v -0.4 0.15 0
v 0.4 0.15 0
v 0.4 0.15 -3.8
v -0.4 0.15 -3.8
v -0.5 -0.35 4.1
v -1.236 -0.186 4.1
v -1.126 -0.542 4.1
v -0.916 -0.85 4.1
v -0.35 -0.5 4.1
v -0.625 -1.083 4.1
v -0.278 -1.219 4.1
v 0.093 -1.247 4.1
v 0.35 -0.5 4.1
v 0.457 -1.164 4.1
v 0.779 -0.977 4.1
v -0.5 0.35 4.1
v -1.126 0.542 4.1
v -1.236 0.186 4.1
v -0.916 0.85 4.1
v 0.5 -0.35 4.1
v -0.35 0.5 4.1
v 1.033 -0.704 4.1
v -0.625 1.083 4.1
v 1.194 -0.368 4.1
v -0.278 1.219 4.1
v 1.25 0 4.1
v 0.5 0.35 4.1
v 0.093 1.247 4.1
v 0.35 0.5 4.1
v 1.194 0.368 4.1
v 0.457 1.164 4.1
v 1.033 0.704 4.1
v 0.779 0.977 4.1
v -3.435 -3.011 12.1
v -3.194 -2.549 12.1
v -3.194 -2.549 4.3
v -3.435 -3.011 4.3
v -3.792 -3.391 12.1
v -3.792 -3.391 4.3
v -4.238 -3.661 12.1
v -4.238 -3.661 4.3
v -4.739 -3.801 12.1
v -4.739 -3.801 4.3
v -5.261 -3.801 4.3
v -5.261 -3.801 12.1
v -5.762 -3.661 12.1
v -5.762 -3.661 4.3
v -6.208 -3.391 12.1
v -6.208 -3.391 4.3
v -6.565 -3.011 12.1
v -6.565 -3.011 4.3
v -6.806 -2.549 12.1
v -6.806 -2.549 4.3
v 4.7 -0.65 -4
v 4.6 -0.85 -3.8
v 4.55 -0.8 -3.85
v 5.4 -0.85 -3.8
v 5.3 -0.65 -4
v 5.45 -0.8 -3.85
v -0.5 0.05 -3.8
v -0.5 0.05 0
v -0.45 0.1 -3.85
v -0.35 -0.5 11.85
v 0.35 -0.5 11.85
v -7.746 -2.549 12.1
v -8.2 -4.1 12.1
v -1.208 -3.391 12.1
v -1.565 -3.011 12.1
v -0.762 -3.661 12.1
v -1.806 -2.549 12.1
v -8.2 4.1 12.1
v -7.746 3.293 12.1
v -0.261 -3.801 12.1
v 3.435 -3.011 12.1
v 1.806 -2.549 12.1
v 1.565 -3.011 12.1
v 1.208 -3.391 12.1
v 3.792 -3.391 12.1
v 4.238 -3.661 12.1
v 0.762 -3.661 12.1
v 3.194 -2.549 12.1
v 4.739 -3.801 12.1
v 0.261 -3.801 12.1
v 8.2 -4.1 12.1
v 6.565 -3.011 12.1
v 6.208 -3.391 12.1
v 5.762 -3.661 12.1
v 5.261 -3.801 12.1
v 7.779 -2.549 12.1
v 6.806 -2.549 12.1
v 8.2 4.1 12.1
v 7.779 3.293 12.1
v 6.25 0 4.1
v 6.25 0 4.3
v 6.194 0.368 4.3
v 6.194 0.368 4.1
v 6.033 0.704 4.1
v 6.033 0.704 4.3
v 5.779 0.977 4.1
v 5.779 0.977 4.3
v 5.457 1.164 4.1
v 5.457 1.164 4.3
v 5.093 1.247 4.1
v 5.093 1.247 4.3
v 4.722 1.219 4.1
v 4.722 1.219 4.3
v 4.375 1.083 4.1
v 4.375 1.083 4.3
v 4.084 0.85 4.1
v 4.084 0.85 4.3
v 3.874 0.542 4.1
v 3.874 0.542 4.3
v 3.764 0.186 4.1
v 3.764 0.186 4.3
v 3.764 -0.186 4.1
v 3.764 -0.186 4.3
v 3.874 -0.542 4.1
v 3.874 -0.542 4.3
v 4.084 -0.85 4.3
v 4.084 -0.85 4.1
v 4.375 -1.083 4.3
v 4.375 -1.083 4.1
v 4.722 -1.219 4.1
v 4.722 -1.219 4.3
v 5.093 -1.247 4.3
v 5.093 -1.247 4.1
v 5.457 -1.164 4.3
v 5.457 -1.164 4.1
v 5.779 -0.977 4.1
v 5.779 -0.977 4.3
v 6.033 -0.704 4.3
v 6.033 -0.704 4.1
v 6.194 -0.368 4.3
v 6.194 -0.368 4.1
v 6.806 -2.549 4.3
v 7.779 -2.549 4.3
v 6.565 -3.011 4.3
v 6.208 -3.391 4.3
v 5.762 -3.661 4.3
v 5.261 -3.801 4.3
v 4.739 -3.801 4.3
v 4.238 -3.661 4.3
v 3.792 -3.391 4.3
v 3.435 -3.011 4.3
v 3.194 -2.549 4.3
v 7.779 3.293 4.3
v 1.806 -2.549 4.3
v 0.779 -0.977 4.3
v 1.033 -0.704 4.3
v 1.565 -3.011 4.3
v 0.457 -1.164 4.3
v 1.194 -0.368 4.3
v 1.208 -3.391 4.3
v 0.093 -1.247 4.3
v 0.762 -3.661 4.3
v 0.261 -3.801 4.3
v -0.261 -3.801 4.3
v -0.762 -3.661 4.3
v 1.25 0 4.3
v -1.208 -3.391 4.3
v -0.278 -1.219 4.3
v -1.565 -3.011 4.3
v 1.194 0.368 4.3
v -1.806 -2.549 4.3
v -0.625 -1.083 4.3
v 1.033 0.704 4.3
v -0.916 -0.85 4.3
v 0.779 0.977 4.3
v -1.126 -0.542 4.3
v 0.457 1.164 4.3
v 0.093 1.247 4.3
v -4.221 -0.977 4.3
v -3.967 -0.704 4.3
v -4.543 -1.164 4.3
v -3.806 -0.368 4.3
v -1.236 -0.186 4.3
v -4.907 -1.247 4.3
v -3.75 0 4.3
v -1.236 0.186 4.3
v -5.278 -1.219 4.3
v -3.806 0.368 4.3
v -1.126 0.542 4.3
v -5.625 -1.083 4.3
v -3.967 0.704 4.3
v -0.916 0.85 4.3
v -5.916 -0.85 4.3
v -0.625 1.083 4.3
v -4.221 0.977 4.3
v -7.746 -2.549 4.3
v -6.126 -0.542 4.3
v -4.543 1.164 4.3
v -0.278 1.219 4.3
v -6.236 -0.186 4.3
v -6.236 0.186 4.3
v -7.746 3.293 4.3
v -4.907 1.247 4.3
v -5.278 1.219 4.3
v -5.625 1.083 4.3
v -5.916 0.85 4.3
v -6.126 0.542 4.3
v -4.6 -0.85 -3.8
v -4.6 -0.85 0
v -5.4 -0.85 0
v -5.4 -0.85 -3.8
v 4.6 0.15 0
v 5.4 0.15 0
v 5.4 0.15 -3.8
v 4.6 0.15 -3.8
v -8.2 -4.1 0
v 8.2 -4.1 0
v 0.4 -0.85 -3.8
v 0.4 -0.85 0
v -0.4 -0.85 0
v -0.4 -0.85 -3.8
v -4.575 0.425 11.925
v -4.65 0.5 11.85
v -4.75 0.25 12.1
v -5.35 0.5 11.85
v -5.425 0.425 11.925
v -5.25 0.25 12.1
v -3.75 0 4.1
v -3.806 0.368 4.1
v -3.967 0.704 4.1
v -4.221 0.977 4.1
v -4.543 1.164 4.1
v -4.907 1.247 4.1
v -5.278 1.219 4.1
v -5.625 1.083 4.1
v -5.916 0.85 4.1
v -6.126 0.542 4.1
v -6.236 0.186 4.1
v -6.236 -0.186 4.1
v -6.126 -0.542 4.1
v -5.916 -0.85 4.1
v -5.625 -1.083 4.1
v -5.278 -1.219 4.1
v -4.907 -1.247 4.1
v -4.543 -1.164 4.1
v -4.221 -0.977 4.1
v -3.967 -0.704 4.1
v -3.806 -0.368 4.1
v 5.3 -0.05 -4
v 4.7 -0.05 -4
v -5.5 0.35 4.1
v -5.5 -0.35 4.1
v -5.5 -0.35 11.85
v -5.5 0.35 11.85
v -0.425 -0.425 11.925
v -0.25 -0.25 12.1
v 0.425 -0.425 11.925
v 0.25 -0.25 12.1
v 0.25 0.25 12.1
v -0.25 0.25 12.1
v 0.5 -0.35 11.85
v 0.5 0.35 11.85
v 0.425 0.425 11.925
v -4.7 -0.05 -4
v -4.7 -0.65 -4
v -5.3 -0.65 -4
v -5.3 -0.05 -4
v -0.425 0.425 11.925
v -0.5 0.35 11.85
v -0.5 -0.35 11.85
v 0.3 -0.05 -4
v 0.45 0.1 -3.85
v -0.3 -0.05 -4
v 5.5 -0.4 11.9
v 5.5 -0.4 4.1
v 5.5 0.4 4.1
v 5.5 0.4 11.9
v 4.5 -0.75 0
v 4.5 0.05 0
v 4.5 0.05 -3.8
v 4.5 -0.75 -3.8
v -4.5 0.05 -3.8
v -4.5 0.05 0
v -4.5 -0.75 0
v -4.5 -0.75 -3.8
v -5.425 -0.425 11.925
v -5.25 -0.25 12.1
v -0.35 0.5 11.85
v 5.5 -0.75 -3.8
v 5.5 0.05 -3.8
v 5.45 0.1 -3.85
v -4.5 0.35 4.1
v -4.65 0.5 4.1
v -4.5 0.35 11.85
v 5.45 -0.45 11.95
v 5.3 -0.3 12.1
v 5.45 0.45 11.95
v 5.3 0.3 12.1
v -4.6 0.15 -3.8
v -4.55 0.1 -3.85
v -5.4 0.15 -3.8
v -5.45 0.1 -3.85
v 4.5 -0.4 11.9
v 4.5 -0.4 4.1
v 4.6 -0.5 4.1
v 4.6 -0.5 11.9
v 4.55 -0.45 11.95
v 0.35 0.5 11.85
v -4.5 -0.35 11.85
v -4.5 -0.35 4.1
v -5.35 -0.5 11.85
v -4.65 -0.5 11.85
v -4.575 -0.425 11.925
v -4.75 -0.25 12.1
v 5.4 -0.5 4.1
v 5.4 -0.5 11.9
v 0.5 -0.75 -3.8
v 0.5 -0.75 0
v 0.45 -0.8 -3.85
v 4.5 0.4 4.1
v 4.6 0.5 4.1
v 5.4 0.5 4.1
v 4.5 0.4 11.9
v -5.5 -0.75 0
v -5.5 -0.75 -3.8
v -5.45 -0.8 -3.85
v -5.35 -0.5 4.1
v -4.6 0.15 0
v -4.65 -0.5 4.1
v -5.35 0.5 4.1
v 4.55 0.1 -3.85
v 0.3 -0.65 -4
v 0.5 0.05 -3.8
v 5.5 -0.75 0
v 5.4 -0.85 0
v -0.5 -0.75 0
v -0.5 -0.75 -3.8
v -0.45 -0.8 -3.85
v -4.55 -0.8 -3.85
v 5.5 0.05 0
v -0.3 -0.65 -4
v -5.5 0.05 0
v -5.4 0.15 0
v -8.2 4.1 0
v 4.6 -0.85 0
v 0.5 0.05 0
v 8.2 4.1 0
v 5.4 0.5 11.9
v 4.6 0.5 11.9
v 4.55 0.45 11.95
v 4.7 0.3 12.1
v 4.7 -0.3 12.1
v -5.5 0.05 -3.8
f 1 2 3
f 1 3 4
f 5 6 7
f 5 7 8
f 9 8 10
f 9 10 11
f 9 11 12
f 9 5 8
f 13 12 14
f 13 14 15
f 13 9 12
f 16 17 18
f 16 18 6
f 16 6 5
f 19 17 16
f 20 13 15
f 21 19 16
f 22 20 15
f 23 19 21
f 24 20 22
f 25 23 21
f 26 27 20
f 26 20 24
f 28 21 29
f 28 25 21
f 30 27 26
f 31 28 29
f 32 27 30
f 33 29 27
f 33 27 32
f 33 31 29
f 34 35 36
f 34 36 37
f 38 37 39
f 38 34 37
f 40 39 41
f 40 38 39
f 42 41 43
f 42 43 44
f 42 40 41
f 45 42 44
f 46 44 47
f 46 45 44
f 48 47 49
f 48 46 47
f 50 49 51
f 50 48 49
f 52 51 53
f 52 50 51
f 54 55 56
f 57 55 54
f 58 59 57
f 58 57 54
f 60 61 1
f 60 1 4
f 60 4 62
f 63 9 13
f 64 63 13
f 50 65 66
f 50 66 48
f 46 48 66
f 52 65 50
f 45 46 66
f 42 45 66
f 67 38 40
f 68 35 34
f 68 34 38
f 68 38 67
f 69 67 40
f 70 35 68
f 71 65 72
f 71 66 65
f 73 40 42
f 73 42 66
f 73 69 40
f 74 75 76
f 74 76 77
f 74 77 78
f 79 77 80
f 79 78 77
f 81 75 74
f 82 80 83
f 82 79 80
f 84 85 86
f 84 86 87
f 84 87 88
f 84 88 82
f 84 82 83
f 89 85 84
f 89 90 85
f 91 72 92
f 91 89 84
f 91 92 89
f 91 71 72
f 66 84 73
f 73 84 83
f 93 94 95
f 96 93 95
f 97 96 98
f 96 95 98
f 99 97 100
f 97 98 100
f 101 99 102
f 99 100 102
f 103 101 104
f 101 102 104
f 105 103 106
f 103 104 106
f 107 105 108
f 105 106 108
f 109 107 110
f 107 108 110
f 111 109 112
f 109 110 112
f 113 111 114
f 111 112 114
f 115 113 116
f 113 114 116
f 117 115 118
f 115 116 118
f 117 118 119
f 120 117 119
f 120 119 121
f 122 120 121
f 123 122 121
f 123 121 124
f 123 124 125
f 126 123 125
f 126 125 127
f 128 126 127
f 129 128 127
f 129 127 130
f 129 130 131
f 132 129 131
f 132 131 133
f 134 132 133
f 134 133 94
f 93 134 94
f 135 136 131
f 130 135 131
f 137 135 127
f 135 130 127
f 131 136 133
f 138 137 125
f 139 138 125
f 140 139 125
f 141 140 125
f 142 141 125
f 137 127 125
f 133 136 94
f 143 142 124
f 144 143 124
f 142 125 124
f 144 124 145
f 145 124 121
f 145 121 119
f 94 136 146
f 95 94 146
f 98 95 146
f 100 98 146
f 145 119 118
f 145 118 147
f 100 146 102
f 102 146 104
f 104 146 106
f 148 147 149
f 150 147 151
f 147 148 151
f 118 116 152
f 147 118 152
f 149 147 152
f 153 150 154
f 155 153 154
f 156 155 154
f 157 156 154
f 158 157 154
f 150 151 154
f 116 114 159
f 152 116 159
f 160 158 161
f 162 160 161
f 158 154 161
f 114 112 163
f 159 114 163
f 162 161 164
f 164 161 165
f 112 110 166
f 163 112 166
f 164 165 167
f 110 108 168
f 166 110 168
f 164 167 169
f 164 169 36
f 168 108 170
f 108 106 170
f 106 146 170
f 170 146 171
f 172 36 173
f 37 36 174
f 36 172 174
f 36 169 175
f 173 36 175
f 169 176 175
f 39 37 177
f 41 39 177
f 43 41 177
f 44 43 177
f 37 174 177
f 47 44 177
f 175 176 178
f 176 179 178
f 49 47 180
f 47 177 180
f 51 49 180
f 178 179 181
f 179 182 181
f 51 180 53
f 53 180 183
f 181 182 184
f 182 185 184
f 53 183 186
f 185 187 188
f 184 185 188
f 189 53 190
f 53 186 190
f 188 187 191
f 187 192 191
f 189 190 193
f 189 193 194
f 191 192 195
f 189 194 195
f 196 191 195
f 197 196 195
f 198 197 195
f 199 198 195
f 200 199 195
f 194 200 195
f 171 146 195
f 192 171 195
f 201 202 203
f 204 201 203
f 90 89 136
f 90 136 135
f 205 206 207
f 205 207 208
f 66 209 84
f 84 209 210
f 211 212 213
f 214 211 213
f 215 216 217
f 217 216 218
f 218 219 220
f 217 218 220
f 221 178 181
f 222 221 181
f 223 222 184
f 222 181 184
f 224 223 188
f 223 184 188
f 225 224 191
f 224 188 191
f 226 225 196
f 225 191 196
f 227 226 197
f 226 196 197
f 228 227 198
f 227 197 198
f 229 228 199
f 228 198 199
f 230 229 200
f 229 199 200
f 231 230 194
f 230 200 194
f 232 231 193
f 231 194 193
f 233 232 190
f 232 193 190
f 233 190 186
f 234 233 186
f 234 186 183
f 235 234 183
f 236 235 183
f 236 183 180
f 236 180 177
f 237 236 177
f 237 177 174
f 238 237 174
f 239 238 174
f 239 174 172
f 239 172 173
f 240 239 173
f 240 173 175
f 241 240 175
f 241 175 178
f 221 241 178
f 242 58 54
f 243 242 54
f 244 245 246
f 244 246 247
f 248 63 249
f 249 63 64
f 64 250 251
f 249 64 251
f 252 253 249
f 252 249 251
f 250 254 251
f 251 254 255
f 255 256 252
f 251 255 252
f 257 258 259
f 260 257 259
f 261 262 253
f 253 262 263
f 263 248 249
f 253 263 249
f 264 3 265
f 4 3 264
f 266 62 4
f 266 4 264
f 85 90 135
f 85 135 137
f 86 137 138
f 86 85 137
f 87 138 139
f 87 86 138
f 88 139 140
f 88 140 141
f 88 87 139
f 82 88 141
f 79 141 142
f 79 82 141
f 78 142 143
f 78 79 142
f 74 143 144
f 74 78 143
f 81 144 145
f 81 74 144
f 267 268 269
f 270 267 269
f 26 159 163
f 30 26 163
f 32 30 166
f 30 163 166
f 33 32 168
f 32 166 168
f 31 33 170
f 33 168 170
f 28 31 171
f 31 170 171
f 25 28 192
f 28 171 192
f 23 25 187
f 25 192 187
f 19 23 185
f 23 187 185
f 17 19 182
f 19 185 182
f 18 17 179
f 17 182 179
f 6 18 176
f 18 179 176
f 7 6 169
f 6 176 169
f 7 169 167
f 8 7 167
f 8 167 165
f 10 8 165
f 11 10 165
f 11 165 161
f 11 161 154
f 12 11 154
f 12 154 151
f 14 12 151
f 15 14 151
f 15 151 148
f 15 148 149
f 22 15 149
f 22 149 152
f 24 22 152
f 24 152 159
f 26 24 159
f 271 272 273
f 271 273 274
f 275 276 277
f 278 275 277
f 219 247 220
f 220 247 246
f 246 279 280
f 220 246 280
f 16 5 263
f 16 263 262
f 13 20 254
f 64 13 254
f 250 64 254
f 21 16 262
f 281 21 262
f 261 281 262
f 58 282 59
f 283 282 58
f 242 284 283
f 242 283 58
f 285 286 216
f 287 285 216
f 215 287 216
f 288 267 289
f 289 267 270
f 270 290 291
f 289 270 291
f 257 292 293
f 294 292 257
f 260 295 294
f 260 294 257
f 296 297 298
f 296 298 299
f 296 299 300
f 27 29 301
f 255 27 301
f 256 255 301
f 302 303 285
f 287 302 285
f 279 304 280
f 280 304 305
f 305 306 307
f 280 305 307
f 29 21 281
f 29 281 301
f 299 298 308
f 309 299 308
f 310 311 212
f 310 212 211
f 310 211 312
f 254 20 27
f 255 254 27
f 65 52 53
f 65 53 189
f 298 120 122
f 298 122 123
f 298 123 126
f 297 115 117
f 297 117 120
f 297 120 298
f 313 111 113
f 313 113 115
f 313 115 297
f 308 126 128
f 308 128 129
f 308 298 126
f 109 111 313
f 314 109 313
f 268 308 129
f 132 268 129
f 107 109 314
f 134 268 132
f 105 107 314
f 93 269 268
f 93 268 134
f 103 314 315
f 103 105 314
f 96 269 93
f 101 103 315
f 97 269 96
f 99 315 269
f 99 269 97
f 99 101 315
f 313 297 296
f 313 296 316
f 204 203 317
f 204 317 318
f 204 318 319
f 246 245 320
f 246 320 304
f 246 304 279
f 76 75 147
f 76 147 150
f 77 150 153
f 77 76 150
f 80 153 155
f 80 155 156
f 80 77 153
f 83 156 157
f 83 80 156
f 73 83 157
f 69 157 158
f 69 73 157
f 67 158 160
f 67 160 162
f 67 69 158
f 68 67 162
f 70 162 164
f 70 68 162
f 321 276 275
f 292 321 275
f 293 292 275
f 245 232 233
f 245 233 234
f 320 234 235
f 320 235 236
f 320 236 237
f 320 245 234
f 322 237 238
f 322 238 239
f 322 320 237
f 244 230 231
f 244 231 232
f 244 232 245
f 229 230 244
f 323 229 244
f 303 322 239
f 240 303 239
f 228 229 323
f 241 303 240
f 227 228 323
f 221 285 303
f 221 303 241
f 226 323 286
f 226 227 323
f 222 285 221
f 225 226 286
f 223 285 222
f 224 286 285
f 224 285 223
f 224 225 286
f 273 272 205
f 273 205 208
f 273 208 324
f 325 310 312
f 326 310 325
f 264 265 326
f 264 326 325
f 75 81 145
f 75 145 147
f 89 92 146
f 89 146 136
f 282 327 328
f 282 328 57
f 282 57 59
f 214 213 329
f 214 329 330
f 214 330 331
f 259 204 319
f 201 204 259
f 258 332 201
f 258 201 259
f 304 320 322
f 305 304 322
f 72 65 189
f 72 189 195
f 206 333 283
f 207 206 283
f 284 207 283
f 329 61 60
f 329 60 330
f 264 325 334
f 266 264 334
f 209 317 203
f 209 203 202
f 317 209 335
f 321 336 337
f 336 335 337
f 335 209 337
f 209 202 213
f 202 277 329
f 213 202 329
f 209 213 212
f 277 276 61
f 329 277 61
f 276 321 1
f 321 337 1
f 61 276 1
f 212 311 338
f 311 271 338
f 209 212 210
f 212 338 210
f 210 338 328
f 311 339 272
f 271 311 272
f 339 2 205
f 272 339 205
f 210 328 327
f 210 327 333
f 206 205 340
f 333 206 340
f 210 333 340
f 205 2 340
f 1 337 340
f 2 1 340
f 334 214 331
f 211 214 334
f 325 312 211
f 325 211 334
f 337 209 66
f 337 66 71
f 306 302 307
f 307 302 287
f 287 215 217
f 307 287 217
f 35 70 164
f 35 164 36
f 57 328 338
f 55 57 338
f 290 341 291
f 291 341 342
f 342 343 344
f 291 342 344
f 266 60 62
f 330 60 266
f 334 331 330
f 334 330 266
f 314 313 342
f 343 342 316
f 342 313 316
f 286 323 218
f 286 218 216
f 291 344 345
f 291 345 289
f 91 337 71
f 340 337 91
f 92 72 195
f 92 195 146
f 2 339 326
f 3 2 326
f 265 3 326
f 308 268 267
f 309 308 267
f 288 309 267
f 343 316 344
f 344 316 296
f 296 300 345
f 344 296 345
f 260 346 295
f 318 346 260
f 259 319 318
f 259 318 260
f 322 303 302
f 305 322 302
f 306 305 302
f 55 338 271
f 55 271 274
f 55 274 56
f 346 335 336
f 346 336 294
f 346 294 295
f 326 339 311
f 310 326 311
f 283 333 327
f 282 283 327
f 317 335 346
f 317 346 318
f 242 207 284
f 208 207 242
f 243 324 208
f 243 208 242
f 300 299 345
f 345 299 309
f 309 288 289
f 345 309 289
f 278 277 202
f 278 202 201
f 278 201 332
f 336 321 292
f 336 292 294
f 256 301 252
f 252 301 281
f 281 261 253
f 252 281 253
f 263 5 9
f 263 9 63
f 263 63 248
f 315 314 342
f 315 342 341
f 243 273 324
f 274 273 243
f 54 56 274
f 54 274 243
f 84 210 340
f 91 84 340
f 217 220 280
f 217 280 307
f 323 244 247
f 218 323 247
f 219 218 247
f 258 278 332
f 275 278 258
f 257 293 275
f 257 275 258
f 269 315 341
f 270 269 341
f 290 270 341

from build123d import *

# Parameters (mm, degrees)
SKETCH_1_W          = 16.4
SKETCH_1_H          = 8.2
EXTRUDE_1_DEPTH     = 12.1
SKETCH_4_R          = 1.25
CUT_EXTRUDE_3_DEPTH = 8
CUT_EXTRUDE_4_DEPTH = 7.8
SKETCH_7_W          = 1
SKETCH_7_H          = 1
EXTRUDE_2_DEPTH     = 8
CHAMFER_1_SIZE      = 0.15
CHAMFER_2_SIZE      = 0.25
SKETCH_8_W          = 1
SKETCH_8_H          = 1
EXTRUDE_3_DEPTH     = 4
CHAMFER_6_SIZE      = 0.1
CHAMFER_7_SIZE      = 0.2
CHAMFER_10_SIZE     = 0.1
CHAMFER_11_SIZE     = 0.2


with BuildPart() as part:
    # Эскиз1 → Бобышка-Вытянуть1 (new body)
    with BuildSketch(Plane.XY):
        Rectangle(SKETCH_1_W, SKETCH_1_H)
    extrude(amount=EXTRUDE_1_DEPTH)

    # Эскиз4 → Вырез-Вытянуть3 (cut)
    with BuildSketch(Plane.XY.offset(12.1)):
        with Locations((-5, 0)):
            Circle(SKETCH_4_R)
        Circle(SKETCH_4_R)
        with Locations((5, 0)):
            Circle(SKETCH_4_R)
    extrude(amount=-CUT_EXTRUDE_3_DEPTH, mode=Mode.SUBTRACT)

    # Эскиз5 → Вырез-Вытянуть4 (cut)
    with BuildSketch(Plane.XY.offset(12.1)):
        with BuildLine():
            Line((-7.745621634, 0), (-7.745621634, 3.292901982))
            Line((-7.745621634, 3.292901982), (2.778509544, 3.292901982))
            Line((2.778509544, 3.292901982), (7.778509544, 3.292901982))
            Line((7.778509544, 3.292901982), (7.778509544, -2.548957219))
            Line((7.778509544, -2.548957219), (6.80582632, -2.548957219))
            ThreePointArc((6.80582632, -2.548957219), (5, -3.818893996), (3.19417368, -2.548957219))
            Line((3.19417368, -2.548957219), (1.80582632, -2.548957219))
            ThreePointArc((1.80582632, -2.548957219), (0, -3.818893996), (-1.80582632, -2.548957219))
            Line((-1.80582632, -2.548957219), (-3.19417368, -2.548957219))
            ThreePointArc((-3.19417368, -2.548957219), (-5, -3.818893996), (-6.80582632, -2.548957219))
            Line((-6.80582632, -2.548957219), (-7.745621634, -2.548957219))
            Line((-7.745621634, -2.548957219), (-7.745621634, 0))
        make_face()
    extrude(amount=-CUT_EXTRUDE_4_DEPTH, mode=Mode.SUBTRACT)

    # Эскиз7 → Бобышка-Вытянуть2 (add)
    with BuildSketch(Plane.XY.offset(4.1)):
        Rectangle(SKETCH_7_W, SKETCH_7_H)
        with Locations((-5, 0)):
            Rectangle(SKETCH_7_W, SKETCH_7_H)
        with Locations((5, 0)):
            Rectangle(SKETCH_7_W, SKETCH_7_H)
    extrude(amount=EXTRUDE_2_DEPTH)

    # Фаска1
    chamfer_1_edges = [part.edges().sort_by_distance(p)[0] for p in [
        (-4.5, -0.5, 8.1),
        (-4.5, 0.5, 8.1),
        (-5.5, 0.5, 8.1),
        (-5.5, -0.5, 8.1),
        (0.5, -0.5, 8.1),
        (0.5, 0.5, 8.1),
        (-0.5, 0.5, 8.1),
        (-0.5, -0.5, 8.1),
    ]]
    chamfer(chamfer_1_edges, length=CHAMFER_1_SIZE)

    # Фаска2
    # the kernel refuses this chamfer: 0.25 mm, written as the material it takes off along each edge
    with BuildSketch(Plane(origin=(-0.5, -0.992920747, 12.1), x_dir=(-0.027495876610586414, 0, -0.9996219169112968), z_dir=(0, 1, 0)), Plane(origin=(-0.992920747, 0.5, 12.1), x_dir=(0, 0.027495876610586414, -0.9996219169112968), z_dir=(1, 0, 0)), Plane(origin=(0.5, 0.992920747, 12.1), x_dir=(0.027495876610586414, 0, -0.9996219169112968), z_dir=(0, -1, 0)), Plane(origin=(0.992920747, -0.5, 12.1), x_dir=(0, -0.027495876610586414, -0.9996219169112968), z_dir=(-1, 0, 0)), Plane(origin=(-4.5, 0.992920747, 12.1), x_dir=(0.02749587661058555, 0, -0.9996219169112968), z_dir=(0, -1, 0)), Plane(origin=(-4.007079253, -0.5, 12.1), x_dir=(0, -0.027495876610586414, -0.9996219169112968), z_dir=(-1, 0, 0)), Plane(origin=(-5.5, -0.992920747, 12.1), x_dir=(-0.02749587661058555, 0, -0.9996219169112968), z_dir=(0, 1, 0)), Plane(origin=(-5.992920747, 0.5, 12.1), x_dir=(0, 0.027495876610586414, -0.9996219169112968), z_dir=(1, 0, 0))) as chamfer_2_piece_1:
        Polygon((CHAMFER_2_SIZE * 0.999621916911, -CHAMFER_2_SIZE * 0.0274958766106), (-CHAMFER_2_SIZE * 0.0274958766106, -CHAMFER_2_SIZE * 0.999621916911), (0, 0), align=None)
    extrude(amount=1.985841494, mode=Mode.SUBTRACT)

    # Эскиз8 → Бобышка-Вытянуть3 (add)
    with BuildSketch(Plane(origin=(0, -4.1, 0), x_dir=(-1, 0, 0), z_dir=(0, 0, 1))):
        with Locations((0, -3.75)):
            Rectangle(SKETCH_8_W, SKETCH_8_H)
        with Locations((5, -3.75)):
            Rectangle(SKETCH_8_W, SKETCH_8_H)
        with Locations((-5, -3.75)):
            Rectangle(SKETCH_8_W, SKETCH_8_H)
    extrude(amount=-EXTRUDE_3_DEPTH)

    # Фаска6
    chamfer_6_edges = [part.edges().sort_by_distance(p)[0] for p in [
        (5.5, -0.5, 8.1),
        (5.5, 0.5, 8.1),
        (4.5, 0.5, 8.1),
        (4.5, -0.5, 8.1),
    ]]
    chamfer(chamfer_6_edges, length=CHAMFER_6_SIZE)

    # Фаска7
    # the kernel refuses this chamfer: 0.2 mm, written as the material it takes off along each edge
    with BuildSketch(Plane(origin=(5.5, 0.914336598, 12.1), x_dir=(0.02749587661058742, 0, -0.9996219169112966), z_dir=(0, -1, 0)), Plane(origin=(5.914336598, -0.5, 12.1), x_dir=(0, -0.02749587661058634, -0.9996219169112966), z_dir=(-1, 0, 0)), Plane(origin=(4.5, -0.914336598, 12.1), x_dir=(-0.02749587661058742, 0, -0.9996219169112966), z_dir=(0, 1, 0)), Plane(origin=(4.085663402, 0.5, 12.1), x_dir=(0, 0.02749587661058634, -0.9996219169112966), z_dir=(1, 0, 0))) as chamfer_7_piece_1:
        Polygon((CHAMFER_7_SIZE * 0.999621916911, -CHAMFER_7_SIZE * 0.0274958766106), (-CHAMFER_7_SIZE * 0.0274958766106, -CHAMFER_7_SIZE * 0.999621916911), (0, 0), align=None)
    extrude(amount=1.828673195, mode=Mode.SUBTRACT)

    # Фаска10
    chamfer_10_edges = [part.edges().sort_by_distance(p)[0] for p in [
        (-4.5, 0.15, -2),
        (-4.5, -0.85, -2),
        (-5.5, -0.85, -2),
        (-5.5, 0.15, -2),
        (0.5, 0.15, -2),
        (0.5, -0.85, -2),
        (-0.5, -0.85, -2),
        (-0.5, 0.15, -2),
        (5.5, 0.15, -2),
        (5.5, -0.85, -2),
        (4.5, -0.85, -2),
        (4.5, 0.15, -2),
    ]]
    chamfer(chamfer_10_edges, length=CHAMFER_10_SIZE)

    # Фаска11
    # the kernel refuses this chamfer: 0.2 mm, written as the material it takes off along each edge
    with BuildSketch(Plane(origin=(-4.5, 0.564336598, -4), x_dir=(0.027495876610587302, 0, 0.9996219169112966), z_dir=(0, -1, 0)), Plane(origin=(-5.914336598, 0.15, -4), x_dir=(0, 0.027495876610586355, 0.9996219169112966), z_dir=(1, 0, 0)), Plane(origin=(-5.5, -1.264336598, -4), x_dir=(-0.027495876610587302, 0, 0.9996219169112966), z_dir=(0, 1, 0)), Plane(origin=(-4.085663402, -0.85, -4), x_dir=(0, -0.027495876610586223, 0.9996219169112966), z_dir=(-1, 0, 0)), Plane(origin=(0.914336598, -0.85, -4), x_dir=(0, -0.027495876610586223, 0.9996219169112966), z_dir=(-1, 0, 0)), Plane(origin=(-0.5, -1.264336598, -4), x_dir=(-0.027495876610586223, 0, 0.9996219169112966), z_dir=(0, 1, 0)), Plane(origin=(-0.914336598, 0.15, -4), x_dir=(0, 0.027495876610586355, 0.9996219169112966), z_dir=(1, 0, 0)), Plane(origin=(0.5, 0.564336598, -4), x_dir=(0.027495876610586223, 0, 0.9996219169112966), z_dir=(0, -1, 0)), Plane(origin=(4.5, -1.264336598, -4), x_dir=(-0.027495876610587302, 0, 0.9996219169112966), z_dir=(0, 1, 0)), Plane(origin=(4.085663402, 0.15, -4), x_dir=(0, 0.027495876610586355, 0.9996219169112966), z_dir=(1, 0, 0)), Plane(origin=(5.5, 0.564336598, -4), x_dir=(0.027495876610587302, 0, 0.9996219169112966), z_dir=(0, -1, 0)), Plane(origin=(5.914336598, -0.85, -4), x_dir=(0, -0.027495876610586223, 0.9996219169112966), z_dir=(-1, 0, 0))) as chamfer_11_piece_1:
        Polygon((CHAMFER_11_SIZE * 0.999621916911, CHAMFER_11_SIZE * 0.0274958766106), (-CHAMFER_11_SIZE * 0.0274958766106, CHAMFER_11_SIZE * 0.999621916911), (0, 0), align=None)
    extrude(amount=1.828673195, mode=Mode.SUBTRACT)


solid = part.part
